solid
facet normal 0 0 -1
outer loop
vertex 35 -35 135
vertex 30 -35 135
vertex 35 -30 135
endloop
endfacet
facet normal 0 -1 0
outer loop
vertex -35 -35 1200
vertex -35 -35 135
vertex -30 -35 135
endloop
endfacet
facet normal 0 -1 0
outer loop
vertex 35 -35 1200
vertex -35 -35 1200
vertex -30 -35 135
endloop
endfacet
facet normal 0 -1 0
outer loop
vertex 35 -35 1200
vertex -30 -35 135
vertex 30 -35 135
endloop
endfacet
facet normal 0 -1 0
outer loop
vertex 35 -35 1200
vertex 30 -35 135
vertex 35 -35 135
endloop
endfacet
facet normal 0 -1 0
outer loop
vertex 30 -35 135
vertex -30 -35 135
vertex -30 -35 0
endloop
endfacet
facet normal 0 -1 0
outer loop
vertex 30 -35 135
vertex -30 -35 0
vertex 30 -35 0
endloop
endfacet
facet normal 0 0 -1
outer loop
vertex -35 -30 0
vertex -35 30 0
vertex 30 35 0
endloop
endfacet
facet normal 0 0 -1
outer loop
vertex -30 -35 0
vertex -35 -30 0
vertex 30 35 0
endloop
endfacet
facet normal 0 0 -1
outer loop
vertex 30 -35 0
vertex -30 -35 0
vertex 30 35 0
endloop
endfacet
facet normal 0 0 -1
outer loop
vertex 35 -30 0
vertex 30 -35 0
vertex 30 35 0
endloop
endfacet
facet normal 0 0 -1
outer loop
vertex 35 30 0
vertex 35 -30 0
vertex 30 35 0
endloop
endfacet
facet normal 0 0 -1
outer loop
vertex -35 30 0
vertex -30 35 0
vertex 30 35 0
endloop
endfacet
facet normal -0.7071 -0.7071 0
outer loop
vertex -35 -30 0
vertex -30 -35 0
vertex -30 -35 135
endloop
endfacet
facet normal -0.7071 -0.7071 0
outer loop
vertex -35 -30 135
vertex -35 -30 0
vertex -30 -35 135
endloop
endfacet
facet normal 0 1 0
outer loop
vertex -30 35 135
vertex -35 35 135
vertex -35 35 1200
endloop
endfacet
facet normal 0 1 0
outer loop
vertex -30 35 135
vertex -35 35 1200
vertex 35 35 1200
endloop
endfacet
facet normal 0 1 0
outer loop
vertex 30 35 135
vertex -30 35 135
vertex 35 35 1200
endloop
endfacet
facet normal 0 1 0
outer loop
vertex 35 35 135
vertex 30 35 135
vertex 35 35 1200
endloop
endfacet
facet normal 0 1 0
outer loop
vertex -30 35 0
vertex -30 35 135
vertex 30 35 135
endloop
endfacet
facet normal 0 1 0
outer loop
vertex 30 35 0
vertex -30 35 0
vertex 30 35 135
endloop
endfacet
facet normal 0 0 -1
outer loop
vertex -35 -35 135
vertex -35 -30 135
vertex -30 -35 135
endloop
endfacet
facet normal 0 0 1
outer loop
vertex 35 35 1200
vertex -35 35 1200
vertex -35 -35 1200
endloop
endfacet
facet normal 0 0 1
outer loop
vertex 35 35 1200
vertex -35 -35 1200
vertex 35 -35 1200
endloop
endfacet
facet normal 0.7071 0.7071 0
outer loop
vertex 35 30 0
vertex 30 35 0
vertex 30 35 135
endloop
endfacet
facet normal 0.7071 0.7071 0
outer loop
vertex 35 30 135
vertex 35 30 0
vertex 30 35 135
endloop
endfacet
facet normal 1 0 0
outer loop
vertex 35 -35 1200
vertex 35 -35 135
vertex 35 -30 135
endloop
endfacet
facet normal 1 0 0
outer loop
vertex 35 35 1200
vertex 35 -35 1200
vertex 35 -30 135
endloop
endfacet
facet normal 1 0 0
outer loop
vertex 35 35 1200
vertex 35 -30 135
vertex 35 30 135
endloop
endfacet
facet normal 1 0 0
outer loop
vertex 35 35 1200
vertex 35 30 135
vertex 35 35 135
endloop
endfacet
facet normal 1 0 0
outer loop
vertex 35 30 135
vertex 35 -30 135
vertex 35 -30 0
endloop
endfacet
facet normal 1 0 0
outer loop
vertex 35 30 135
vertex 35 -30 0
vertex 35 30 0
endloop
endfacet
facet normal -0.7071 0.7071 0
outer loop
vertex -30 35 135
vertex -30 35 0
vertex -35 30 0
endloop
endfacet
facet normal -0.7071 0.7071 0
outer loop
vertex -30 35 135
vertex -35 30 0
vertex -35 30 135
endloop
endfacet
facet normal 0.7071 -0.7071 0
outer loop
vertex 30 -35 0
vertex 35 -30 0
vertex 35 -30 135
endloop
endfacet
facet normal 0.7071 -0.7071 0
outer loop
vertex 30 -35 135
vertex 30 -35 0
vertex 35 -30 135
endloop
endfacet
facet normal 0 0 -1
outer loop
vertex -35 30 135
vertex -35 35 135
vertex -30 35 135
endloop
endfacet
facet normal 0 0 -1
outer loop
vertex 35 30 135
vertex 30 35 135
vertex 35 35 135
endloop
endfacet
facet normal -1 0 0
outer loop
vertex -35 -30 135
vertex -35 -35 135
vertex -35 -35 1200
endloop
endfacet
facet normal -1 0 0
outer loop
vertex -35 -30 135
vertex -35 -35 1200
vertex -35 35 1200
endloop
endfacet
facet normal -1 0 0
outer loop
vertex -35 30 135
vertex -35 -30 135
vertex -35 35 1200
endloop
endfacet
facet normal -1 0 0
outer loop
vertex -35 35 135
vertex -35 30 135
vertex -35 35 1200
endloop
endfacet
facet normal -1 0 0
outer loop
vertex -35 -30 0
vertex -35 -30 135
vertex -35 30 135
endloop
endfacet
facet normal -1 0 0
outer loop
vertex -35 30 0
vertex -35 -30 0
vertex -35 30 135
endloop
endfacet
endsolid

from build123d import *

# Parameters (mm, degrees)
F0_W     = 70
F0_H     = 70
F1_DEPTH = 135
F2_SIZE  = 5
F3_W     = 70
F3_H     = 70
F4_DEPTH = 1065


with BuildPart() as f1:
    # F0 (on Top) → F1 (new body)
    with BuildSketch(Plane.XY):
        Rectangle(F0_W, F0_H)
    extrude(amount=F1_DEPTH)

    # F2
    f2_edges = [f1.edges().sort_by_distance(p)[0] for p in [
        (35, -35, 67.5),
        (-35, -35, 67.5),
        (35, 35, 67.5),
        (-35, 35, 67.5),
    ]]
    chamfer(f2_edges, length=F2_SIZE)

    # F3 (on face) → F4 (join)
    with BuildSketch(Plane.XY.offset(135)):
        Rectangle(F3_W, F3_H)
    extrude(amount=F4_DEPTH)


solid = f1.part
